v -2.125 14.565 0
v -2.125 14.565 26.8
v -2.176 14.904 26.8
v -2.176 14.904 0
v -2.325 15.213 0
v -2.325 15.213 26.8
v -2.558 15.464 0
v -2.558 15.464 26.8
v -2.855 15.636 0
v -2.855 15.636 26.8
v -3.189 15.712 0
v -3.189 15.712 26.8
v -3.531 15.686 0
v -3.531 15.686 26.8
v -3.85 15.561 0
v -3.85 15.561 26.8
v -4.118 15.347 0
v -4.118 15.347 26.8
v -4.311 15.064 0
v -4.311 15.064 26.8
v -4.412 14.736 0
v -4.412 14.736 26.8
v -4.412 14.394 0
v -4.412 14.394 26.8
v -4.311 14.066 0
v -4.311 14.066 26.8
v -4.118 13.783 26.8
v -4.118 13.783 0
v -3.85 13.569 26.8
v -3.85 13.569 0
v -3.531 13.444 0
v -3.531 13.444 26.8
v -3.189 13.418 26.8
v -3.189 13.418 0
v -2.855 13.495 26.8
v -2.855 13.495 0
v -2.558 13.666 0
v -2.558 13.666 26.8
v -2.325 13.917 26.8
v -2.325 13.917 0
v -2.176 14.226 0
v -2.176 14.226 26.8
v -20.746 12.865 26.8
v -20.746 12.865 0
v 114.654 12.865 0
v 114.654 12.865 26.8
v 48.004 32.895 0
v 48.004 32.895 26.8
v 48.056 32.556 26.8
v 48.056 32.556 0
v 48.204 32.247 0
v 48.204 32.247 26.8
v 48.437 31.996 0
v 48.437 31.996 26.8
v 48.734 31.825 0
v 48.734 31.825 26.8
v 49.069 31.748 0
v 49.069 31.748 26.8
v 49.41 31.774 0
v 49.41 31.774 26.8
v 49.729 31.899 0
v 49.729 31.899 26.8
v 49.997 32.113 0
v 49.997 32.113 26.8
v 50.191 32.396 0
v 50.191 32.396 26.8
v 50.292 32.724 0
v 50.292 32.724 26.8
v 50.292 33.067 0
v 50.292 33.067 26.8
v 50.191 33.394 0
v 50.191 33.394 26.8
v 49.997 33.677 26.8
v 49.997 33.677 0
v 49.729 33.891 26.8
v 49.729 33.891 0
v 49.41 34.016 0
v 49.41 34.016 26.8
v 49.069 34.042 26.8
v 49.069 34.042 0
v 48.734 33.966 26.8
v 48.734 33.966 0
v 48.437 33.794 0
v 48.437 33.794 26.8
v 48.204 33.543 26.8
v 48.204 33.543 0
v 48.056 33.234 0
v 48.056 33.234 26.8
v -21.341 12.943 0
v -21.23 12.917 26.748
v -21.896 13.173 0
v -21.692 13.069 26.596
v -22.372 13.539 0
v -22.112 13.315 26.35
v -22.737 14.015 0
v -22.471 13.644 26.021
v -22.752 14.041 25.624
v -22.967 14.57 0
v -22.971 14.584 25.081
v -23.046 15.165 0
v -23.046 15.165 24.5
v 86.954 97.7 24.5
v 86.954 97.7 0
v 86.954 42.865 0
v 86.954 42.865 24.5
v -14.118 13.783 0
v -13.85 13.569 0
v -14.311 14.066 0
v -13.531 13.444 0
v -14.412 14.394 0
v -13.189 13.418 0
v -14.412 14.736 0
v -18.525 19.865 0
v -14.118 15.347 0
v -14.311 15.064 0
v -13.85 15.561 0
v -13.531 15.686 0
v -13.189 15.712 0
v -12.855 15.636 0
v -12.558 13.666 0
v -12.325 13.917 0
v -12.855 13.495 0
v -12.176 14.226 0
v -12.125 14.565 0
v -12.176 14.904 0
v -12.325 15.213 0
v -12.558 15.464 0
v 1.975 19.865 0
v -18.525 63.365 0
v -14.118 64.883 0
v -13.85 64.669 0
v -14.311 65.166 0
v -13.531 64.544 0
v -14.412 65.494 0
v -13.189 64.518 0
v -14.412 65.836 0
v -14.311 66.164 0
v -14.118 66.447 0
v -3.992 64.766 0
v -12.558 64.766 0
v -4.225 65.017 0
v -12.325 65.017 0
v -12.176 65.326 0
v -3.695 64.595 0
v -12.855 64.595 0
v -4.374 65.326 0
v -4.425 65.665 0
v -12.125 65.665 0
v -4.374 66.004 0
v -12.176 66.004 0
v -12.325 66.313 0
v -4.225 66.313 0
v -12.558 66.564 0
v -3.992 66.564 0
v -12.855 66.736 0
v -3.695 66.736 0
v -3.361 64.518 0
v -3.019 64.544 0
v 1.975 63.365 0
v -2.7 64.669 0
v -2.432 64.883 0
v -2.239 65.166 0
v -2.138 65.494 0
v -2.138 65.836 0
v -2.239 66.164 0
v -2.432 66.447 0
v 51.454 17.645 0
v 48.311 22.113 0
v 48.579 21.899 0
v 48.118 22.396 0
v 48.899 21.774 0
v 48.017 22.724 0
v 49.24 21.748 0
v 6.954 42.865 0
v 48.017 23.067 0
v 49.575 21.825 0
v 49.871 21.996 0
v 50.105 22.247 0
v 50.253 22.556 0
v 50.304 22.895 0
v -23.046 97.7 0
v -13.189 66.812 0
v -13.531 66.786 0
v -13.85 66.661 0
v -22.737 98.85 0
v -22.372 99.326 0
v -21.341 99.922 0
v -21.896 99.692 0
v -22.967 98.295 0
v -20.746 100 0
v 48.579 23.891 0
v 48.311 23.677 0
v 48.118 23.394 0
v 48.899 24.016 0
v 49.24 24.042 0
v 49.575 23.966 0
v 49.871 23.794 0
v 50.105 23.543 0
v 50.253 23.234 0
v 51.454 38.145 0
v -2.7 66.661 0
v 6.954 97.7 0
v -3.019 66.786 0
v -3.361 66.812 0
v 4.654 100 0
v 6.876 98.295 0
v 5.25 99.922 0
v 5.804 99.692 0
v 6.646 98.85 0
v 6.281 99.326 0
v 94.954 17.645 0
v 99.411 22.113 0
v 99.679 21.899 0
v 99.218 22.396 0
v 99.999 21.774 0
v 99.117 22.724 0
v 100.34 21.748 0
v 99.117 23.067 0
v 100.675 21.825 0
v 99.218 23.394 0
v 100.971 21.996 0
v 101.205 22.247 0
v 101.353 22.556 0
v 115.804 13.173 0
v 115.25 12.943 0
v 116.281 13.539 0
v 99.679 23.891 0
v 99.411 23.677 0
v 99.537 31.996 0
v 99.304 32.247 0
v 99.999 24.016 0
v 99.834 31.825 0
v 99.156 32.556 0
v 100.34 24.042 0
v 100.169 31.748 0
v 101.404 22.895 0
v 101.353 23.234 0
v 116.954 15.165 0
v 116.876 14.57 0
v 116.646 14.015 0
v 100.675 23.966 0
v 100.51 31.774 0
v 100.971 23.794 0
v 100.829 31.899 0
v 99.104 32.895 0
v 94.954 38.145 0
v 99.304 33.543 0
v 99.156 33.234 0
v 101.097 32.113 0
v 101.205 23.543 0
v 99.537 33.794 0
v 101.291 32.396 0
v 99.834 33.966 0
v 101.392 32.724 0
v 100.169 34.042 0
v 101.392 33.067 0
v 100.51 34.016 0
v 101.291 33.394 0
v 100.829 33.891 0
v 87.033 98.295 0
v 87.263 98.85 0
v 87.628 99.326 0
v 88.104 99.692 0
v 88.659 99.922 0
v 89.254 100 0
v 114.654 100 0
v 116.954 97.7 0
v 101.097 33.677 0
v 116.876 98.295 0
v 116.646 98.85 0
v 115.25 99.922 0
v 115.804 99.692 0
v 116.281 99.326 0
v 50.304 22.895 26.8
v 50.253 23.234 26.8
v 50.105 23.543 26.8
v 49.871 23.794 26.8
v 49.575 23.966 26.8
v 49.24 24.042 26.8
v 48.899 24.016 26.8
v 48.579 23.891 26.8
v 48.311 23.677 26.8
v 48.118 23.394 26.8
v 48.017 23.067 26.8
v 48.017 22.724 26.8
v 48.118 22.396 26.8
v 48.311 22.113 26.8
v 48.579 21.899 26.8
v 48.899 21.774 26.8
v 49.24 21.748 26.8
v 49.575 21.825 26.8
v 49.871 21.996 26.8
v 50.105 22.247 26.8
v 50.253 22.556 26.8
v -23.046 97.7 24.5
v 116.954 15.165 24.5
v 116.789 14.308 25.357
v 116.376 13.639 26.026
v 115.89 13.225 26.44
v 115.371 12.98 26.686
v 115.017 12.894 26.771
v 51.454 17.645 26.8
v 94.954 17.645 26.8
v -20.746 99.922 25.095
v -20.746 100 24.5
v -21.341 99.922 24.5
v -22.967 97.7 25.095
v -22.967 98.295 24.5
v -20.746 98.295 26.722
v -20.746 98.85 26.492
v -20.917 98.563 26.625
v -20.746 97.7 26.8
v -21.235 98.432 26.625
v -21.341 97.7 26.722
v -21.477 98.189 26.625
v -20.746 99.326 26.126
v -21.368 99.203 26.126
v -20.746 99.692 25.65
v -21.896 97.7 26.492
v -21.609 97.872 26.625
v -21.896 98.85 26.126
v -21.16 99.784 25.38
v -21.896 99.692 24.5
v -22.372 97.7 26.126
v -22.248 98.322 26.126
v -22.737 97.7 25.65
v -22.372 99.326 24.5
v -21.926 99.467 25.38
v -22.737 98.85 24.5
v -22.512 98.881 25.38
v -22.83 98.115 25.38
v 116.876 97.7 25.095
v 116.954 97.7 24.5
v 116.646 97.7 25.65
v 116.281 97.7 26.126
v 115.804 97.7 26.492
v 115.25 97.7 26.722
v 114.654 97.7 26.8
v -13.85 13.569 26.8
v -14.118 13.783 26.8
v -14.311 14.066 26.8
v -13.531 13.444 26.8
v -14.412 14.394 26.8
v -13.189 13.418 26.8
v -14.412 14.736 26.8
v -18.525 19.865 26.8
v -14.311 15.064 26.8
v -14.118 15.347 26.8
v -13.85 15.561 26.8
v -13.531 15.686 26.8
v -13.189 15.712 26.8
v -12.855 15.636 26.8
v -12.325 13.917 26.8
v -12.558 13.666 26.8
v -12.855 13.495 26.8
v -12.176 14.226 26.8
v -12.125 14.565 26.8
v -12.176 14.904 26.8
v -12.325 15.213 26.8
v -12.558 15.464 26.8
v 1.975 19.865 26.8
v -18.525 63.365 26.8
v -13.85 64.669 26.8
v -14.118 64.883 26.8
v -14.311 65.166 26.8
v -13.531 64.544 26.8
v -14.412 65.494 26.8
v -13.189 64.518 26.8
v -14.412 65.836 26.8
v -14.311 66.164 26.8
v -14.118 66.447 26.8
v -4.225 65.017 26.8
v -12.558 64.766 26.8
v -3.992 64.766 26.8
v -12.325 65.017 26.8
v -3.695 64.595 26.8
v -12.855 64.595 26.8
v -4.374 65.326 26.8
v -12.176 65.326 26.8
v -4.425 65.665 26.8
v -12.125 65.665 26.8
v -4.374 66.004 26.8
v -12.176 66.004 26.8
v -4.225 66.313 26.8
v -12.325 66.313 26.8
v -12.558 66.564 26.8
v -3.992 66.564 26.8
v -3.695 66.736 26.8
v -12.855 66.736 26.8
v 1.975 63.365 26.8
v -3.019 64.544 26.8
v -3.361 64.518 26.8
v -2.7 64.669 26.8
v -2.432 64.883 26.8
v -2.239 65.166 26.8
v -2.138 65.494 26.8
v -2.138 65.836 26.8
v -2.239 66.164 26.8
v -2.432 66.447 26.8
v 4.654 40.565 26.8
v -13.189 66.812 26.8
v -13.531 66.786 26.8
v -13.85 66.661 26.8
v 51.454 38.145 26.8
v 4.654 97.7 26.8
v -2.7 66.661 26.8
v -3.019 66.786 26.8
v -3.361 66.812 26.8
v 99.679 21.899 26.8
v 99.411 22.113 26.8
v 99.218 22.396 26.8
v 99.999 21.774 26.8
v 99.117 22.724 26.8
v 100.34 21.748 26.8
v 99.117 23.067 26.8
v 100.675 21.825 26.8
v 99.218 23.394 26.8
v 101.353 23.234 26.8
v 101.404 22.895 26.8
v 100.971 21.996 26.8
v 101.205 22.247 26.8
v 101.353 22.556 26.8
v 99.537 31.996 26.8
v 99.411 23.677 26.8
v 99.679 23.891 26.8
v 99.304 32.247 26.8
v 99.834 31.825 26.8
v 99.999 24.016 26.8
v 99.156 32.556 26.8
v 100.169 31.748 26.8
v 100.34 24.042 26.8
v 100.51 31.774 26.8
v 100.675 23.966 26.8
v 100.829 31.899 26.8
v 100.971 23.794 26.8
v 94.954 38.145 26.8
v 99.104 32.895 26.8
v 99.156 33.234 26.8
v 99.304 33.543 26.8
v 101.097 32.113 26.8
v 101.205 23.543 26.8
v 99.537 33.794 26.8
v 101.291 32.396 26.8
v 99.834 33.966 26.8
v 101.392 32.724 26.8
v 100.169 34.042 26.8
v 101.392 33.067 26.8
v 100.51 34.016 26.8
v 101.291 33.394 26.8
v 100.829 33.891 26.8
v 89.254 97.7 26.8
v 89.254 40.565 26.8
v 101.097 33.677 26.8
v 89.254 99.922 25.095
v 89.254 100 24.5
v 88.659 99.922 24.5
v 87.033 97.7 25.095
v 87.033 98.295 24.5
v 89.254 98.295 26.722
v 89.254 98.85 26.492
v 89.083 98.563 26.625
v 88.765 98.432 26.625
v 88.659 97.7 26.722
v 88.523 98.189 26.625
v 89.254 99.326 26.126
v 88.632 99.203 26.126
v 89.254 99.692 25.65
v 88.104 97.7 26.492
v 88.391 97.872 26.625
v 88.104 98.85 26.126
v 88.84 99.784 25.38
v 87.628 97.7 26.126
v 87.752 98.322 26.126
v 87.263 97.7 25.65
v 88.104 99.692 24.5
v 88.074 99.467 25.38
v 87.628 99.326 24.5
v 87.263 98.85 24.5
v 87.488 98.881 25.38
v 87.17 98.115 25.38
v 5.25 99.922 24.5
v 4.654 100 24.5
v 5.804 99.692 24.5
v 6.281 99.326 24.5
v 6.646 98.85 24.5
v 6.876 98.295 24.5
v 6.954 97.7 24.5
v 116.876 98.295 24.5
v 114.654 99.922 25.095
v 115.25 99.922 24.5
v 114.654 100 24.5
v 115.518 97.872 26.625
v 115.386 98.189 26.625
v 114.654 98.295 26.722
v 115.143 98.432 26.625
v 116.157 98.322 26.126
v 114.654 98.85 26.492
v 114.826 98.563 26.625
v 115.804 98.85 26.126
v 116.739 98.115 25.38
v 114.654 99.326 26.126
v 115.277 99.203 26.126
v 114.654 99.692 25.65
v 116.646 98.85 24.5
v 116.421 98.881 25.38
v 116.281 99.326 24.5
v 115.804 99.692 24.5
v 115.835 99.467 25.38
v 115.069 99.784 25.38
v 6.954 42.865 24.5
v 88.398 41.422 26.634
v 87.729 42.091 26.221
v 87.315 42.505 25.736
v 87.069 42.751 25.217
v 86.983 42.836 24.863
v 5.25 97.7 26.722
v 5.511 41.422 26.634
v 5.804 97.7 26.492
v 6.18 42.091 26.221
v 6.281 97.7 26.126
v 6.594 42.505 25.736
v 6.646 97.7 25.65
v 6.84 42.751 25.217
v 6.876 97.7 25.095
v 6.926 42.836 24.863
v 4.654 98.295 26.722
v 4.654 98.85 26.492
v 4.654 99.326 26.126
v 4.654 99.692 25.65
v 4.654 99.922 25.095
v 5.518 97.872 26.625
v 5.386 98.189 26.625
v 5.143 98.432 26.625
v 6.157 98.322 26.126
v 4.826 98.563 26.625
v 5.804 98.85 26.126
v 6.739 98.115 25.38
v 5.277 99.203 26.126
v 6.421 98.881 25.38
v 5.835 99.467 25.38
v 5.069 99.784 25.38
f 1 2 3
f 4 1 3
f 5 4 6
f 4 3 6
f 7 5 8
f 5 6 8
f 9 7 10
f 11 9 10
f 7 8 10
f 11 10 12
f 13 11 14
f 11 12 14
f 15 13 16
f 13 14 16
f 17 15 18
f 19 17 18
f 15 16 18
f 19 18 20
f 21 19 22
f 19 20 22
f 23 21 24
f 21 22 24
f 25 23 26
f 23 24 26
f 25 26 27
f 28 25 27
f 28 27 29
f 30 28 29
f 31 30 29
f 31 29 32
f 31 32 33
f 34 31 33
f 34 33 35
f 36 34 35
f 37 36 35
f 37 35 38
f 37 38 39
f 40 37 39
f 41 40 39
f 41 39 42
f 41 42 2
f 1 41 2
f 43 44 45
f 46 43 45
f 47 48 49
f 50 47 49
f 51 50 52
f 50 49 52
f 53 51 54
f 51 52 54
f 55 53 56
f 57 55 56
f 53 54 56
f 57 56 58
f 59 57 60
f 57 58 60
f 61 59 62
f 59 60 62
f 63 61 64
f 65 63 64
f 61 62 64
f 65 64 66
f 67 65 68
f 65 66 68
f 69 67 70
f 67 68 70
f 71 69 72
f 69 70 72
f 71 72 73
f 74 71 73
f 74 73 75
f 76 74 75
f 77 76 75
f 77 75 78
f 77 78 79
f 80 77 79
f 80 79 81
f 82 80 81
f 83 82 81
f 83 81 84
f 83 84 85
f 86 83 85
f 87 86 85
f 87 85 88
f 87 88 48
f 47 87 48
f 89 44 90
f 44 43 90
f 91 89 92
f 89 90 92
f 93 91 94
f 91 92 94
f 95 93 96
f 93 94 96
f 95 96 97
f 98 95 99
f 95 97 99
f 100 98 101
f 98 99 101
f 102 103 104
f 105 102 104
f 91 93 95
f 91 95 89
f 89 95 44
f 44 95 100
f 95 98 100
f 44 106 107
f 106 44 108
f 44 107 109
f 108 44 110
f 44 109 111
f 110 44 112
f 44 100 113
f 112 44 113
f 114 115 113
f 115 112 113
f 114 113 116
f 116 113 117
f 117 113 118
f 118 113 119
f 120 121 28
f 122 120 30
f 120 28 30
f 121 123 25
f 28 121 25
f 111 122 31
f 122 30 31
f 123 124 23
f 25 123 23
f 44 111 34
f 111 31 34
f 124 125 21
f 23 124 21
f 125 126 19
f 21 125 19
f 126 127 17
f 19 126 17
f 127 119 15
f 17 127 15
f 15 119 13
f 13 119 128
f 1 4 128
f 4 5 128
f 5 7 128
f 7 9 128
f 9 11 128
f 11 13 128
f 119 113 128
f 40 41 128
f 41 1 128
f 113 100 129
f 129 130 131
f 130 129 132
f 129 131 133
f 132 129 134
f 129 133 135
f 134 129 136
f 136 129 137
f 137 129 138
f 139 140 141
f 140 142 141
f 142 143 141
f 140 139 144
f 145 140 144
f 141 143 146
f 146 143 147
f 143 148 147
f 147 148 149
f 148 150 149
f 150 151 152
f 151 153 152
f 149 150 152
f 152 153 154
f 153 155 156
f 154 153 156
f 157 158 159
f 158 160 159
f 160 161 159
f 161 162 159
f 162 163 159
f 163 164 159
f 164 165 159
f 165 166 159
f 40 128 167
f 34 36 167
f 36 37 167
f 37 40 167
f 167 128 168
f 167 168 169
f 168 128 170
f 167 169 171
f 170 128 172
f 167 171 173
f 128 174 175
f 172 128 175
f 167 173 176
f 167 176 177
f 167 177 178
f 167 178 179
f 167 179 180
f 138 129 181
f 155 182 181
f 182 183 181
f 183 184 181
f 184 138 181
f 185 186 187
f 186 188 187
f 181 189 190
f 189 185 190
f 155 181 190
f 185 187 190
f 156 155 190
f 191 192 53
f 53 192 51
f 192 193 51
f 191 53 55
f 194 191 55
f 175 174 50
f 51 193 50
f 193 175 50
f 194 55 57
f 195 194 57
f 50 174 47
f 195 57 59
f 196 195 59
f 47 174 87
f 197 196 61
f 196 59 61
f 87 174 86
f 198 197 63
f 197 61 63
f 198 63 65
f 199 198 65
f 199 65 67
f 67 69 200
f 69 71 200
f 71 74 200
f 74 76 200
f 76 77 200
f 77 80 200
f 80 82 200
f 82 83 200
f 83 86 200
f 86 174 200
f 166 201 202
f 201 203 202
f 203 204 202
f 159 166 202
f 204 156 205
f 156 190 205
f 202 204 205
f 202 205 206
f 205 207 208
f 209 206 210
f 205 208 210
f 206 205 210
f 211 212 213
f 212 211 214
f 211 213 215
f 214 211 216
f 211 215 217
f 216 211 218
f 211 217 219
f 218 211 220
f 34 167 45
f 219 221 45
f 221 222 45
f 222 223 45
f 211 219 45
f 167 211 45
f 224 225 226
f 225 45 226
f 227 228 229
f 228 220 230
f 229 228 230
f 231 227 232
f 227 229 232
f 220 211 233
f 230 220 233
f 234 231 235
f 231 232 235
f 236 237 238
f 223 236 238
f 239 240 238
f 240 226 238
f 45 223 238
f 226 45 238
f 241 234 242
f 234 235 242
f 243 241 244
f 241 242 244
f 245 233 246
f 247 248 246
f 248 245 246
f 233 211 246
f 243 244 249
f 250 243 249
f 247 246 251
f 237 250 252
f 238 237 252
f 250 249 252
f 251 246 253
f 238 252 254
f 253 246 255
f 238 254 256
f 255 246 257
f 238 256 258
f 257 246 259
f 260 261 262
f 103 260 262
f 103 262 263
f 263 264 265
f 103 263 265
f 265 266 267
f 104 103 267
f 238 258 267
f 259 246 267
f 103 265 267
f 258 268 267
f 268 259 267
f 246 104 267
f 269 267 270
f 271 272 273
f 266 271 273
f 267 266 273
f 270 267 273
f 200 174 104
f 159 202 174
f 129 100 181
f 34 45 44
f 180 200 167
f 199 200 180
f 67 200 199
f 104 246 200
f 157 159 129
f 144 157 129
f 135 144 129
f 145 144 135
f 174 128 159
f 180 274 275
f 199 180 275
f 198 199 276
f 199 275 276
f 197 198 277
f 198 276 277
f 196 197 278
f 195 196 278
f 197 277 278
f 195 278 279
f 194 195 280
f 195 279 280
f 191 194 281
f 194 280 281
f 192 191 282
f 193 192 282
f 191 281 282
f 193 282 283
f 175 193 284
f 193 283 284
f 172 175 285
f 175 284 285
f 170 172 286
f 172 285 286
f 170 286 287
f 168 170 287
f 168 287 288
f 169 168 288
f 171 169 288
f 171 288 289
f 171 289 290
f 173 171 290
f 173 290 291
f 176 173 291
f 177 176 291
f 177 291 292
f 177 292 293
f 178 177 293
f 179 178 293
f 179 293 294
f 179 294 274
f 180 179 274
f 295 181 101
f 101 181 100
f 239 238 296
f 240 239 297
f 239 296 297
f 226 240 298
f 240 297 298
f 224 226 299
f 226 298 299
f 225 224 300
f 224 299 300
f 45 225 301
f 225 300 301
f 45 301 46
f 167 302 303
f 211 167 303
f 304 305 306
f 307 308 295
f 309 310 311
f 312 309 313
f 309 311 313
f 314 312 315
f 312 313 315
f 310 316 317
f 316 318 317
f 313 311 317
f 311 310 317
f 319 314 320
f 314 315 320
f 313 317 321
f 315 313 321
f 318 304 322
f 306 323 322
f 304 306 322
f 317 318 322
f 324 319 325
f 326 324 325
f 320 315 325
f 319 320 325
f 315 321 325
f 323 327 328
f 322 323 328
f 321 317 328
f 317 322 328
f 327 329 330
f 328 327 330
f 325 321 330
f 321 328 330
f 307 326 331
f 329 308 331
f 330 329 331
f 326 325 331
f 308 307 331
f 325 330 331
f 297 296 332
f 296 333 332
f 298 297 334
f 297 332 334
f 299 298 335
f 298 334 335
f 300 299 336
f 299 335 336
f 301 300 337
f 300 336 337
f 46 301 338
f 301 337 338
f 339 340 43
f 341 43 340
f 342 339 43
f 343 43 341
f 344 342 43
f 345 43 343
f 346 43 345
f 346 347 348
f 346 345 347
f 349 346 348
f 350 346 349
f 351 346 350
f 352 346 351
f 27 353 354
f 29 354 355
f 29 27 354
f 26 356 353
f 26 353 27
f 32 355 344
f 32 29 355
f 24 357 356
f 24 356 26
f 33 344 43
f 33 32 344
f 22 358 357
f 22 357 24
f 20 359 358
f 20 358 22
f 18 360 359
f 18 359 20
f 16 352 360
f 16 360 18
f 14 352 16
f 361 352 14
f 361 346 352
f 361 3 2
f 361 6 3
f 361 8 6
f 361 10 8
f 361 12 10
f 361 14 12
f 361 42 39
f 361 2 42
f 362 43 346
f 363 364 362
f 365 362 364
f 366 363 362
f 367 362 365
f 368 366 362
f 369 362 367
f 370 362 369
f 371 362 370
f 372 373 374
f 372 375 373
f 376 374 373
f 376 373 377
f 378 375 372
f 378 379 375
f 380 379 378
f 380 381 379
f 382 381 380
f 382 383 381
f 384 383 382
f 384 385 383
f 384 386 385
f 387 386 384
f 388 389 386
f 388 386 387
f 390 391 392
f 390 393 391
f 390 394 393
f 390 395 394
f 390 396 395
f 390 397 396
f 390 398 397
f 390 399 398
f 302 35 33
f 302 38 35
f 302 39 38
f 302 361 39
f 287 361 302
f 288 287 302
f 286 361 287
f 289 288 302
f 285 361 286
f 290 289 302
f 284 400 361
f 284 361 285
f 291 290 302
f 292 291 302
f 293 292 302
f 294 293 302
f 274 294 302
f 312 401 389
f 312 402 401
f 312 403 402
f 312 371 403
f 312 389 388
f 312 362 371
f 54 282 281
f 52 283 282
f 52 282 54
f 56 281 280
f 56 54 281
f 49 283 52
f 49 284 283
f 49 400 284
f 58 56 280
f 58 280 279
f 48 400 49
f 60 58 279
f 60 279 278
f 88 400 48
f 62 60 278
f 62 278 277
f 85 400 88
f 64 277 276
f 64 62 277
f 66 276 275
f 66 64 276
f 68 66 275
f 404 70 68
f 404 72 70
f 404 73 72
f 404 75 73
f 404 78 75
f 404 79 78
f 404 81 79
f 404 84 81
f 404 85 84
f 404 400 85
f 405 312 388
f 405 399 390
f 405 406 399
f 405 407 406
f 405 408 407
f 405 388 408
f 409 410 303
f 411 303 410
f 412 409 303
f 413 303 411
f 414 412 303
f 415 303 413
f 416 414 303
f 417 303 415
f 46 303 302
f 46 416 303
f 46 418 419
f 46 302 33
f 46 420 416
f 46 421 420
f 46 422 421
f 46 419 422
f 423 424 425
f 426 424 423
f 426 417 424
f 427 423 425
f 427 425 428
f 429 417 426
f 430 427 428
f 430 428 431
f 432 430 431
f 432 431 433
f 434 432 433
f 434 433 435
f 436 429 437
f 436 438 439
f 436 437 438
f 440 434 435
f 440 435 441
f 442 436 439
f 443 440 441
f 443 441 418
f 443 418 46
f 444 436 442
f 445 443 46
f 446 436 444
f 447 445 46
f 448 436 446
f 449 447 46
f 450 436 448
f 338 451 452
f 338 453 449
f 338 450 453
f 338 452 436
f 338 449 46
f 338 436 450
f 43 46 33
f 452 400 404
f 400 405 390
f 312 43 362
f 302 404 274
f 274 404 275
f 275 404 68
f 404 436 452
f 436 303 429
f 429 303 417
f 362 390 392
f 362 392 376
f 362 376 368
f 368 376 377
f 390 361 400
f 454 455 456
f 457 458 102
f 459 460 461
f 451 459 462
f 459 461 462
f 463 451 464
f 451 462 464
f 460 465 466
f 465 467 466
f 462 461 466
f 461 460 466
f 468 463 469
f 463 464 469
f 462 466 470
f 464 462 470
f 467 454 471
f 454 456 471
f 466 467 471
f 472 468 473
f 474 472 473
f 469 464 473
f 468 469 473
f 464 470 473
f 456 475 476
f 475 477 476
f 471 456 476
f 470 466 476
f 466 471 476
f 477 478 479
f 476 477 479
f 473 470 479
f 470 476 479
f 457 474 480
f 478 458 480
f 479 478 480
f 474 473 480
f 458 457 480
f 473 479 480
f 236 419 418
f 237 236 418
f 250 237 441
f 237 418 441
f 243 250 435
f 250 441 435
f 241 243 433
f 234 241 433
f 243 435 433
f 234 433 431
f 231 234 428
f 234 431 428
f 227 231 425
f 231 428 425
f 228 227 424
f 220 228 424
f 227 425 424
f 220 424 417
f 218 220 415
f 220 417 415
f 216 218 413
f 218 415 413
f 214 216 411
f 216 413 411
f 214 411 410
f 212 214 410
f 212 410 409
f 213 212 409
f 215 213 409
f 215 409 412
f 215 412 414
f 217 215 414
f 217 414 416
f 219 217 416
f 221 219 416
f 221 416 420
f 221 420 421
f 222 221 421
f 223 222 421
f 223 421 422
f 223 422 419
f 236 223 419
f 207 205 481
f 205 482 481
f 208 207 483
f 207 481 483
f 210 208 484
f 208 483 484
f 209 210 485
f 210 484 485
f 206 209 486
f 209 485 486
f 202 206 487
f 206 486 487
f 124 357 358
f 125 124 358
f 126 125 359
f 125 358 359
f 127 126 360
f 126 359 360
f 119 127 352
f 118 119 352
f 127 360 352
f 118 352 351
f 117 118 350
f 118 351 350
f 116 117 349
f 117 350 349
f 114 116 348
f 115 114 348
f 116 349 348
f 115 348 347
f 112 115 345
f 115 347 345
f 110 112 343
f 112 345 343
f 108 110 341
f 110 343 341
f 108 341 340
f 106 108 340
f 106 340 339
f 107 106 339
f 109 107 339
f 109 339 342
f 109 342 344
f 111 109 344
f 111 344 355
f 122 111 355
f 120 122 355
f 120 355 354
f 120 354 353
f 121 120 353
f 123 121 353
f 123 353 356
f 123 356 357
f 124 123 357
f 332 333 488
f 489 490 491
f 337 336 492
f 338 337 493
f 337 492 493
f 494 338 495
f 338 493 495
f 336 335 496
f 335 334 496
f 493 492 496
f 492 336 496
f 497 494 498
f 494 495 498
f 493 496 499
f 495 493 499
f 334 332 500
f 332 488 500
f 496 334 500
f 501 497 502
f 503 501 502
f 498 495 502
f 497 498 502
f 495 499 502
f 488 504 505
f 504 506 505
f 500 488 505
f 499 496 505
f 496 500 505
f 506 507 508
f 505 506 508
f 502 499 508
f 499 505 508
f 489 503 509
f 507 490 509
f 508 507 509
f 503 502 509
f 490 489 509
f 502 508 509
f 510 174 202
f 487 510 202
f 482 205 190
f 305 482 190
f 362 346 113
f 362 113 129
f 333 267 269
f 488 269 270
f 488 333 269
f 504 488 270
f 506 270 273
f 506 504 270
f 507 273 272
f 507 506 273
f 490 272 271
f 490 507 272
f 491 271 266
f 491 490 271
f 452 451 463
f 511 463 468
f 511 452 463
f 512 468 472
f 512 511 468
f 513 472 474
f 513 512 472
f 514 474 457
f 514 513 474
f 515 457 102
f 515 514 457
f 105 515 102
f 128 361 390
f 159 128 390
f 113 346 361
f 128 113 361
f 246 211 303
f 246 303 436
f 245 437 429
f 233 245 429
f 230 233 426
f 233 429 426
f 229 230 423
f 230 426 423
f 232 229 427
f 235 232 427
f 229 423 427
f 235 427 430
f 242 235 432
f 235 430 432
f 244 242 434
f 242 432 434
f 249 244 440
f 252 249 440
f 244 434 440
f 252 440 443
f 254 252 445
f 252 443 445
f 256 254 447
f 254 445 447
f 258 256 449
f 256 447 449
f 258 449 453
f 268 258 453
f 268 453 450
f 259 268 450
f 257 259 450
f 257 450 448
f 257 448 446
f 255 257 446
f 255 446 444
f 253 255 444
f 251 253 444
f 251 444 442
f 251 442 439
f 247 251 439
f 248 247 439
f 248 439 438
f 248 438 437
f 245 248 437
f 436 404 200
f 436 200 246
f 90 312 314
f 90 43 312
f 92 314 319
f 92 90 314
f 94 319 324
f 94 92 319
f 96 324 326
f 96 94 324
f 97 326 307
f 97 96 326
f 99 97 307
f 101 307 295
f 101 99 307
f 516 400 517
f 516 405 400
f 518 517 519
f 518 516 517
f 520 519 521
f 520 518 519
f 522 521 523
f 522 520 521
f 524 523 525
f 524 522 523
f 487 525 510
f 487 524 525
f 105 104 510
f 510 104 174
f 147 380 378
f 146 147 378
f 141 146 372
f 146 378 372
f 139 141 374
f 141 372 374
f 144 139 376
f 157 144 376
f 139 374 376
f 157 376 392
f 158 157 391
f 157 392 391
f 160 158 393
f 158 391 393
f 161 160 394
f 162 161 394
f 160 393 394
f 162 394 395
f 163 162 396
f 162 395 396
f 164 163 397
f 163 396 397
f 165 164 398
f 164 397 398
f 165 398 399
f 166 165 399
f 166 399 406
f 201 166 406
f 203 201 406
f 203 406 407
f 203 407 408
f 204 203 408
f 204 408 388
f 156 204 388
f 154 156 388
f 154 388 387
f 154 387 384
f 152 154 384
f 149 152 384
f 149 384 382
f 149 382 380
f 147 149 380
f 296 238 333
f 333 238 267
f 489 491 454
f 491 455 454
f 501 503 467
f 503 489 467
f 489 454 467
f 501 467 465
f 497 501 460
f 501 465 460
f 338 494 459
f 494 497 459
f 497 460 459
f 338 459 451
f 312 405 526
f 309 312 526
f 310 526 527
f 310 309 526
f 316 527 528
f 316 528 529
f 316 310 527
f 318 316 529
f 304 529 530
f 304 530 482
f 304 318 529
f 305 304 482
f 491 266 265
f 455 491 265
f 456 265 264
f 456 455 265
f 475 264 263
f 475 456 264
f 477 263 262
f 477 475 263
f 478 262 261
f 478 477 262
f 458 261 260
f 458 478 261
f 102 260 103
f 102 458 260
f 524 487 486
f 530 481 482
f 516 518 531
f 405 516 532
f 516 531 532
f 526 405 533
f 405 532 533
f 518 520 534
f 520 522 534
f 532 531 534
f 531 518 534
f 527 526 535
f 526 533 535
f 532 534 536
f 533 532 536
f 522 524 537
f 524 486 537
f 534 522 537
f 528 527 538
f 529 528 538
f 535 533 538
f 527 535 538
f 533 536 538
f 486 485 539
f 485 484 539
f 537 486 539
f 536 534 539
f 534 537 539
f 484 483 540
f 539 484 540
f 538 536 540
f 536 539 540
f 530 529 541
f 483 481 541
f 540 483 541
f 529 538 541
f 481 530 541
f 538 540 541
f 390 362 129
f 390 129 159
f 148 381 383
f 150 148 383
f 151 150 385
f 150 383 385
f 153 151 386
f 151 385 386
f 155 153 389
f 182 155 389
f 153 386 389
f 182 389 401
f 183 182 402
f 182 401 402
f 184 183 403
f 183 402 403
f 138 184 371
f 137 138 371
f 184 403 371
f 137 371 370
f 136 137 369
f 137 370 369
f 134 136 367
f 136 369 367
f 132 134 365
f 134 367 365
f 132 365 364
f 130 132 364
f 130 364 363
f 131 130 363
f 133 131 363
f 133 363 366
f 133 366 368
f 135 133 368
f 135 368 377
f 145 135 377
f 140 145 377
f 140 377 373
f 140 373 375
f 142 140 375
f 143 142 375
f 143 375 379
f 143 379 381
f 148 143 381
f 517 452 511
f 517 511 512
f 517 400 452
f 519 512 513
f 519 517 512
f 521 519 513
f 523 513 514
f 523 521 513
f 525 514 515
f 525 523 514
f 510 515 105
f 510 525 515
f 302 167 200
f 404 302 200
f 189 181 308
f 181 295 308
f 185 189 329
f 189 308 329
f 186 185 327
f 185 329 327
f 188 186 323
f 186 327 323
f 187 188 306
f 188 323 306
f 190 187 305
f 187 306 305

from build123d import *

# Parameters (mm, degrees)
BOSS_EXTRUDE1_DEPTH = 26.8
SKETCH2_W           = 20.5
SKETCH2_H           = 43.5
SKETCH2_W_2         = 43.5
SKETCH2_H_2         = 20.5
CUT_EXTRUDE1_DEPTH  = 157.194070808
SKETCH3_R           = 1.15
BOSS_EXTRUDE2_DEPTH = 26.8
SKETCH3_2_R         = 1.15
CUT_EXTRUDE2_DEPTH  = 157.194070808
SKETCH4_R           = 1.15
CUT_EXTRUDE3_DEPTH  = 157.194070808
FILLET1_R           = 2.3


with BuildPart() as part:
    # Sketch1 → Boss-Extrude1 (new body)
    with BuildSketch(Plane.XY):
        Polygon((86.954468728, 12.865007186), (116.954468728, 12.865007186), (116.954468728, 100), (86.954468728, 100), (86.954468728, 42.865007186), (6.954468728, 42.865007186), (6.954468728, 100), (-23.045531272, 100), (-23.045531272, 12.865007186), (6.954468728, 12.865007186), align=None)
    extrude(amount=BOSS_EXTRUDE1_DEPTH)

    # Sketch2 → Cut-Extrude1 (cut, through all)
    with BuildSketch(Plane.XY.offset(26.8)):
        with Locations((-8.275140501, 41.615007186)):
            Rectangle(SKETCH2_W, SKETCH2_H)
        with Locations((73.204468728, 27.895224973)):
            Rectangle(SKETCH2_W_2, SKETCH2_H_2)
    extrude(amount=-CUT_EXTRUDE1_DEPTH, mode=Mode.SUBTRACT)

    # Sketch3 → Boss-Extrude2 (add, through all)
    with BuildSketch(Plane.XY.offset(26.8)):
        with Locations((-13.275140501, 14.565007186)):
            Circle(SKETCH3_R)
        with Locations((-3.275140501, 14.565007186)):
            Circle(SKETCH3_R)
        with Locations((-13.275140501, 65.665007186)):
            Circle(SKETCH3_R)
        with Locations((-3.275140501, 65.665007186)):
            Circle(SKETCH3_R)
    extrude(amount=-BOSS_EXTRUDE2_DEPTH)

    # Sketch3<2> → Cut-Extrude2 (cut, through all)
    with BuildSketch(Plane.XY.offset(26.8)):
        with Locations((-13.275140501, 14.565007186)):
            Circle(SKETCH3_2_R)
        with Locations((-3.275140501, 14.565007186)):
            Circle(SKETCH3_2_R)
        with Locations((-13.275140501, 65.665007186)):
            Circle(SKETCH3_2_R)
        with Locations(Location((-3.275140501, 65.665007186, 0), (0, 0, 180))):
            Circle(SKETCH3_2_R)
    extrude(amount=-CUT_EXTRUDE2_DEPTH, mode=Mode.SUBTRACT)

    # Sketch4 → Cut-Extrude3 (cut, through all)
    with BuildSketch(Plane.XY.offset(26.8)):
        with Locations((100.254468728, 22.895224973)):
            Circle(SKETCH4_R)
        with Locations(Location((100.254468728, 32.895224973, 0), (0, 0, 180))):
            Circle(SKETCH4_R)
        with Locations((49.154468728, 22.895224973)):
            Circle(SKETCH4_R)
        with Locations(Location((49.154468728, 32.895224973, 0), (0, 0, 180))):
            Circle(SKETCH4_R)
    extrude(amount=-CUT_EXTRUDE3_DEPTH, mode=Mode.SUBTRACT)

    # Fillet1
    fillet1_edges = [part.edges().sort_by_distance(p)[0] for p in [
        (6.954468728, 100, 13.4),
        (86.954468728, 100, 13.4),
        (116.954468728, 100, 13.4),
        (116.954468728, 12.865007186, 13.4),
        (-23.045531272, 12.865007186, 13.4),
        (-23.045531272, 100, 13.4),
        (116.954468728, 56.432503593, 26.8),
        (101.954468728, 100, 26.8),
        (86.954468728, 71.432503593, 26.8),
        (46.954468728, 42.865007186, 26.8),
        (6.954468728, 71.432503593, 26.8),
        (-8.045531272, 100, 26.8),
        (-23.045531272, 56.432503593, 26.8),
    ]]
    fillet(fillet1_edges, radius=FILLET1_R)


solid = part.part
